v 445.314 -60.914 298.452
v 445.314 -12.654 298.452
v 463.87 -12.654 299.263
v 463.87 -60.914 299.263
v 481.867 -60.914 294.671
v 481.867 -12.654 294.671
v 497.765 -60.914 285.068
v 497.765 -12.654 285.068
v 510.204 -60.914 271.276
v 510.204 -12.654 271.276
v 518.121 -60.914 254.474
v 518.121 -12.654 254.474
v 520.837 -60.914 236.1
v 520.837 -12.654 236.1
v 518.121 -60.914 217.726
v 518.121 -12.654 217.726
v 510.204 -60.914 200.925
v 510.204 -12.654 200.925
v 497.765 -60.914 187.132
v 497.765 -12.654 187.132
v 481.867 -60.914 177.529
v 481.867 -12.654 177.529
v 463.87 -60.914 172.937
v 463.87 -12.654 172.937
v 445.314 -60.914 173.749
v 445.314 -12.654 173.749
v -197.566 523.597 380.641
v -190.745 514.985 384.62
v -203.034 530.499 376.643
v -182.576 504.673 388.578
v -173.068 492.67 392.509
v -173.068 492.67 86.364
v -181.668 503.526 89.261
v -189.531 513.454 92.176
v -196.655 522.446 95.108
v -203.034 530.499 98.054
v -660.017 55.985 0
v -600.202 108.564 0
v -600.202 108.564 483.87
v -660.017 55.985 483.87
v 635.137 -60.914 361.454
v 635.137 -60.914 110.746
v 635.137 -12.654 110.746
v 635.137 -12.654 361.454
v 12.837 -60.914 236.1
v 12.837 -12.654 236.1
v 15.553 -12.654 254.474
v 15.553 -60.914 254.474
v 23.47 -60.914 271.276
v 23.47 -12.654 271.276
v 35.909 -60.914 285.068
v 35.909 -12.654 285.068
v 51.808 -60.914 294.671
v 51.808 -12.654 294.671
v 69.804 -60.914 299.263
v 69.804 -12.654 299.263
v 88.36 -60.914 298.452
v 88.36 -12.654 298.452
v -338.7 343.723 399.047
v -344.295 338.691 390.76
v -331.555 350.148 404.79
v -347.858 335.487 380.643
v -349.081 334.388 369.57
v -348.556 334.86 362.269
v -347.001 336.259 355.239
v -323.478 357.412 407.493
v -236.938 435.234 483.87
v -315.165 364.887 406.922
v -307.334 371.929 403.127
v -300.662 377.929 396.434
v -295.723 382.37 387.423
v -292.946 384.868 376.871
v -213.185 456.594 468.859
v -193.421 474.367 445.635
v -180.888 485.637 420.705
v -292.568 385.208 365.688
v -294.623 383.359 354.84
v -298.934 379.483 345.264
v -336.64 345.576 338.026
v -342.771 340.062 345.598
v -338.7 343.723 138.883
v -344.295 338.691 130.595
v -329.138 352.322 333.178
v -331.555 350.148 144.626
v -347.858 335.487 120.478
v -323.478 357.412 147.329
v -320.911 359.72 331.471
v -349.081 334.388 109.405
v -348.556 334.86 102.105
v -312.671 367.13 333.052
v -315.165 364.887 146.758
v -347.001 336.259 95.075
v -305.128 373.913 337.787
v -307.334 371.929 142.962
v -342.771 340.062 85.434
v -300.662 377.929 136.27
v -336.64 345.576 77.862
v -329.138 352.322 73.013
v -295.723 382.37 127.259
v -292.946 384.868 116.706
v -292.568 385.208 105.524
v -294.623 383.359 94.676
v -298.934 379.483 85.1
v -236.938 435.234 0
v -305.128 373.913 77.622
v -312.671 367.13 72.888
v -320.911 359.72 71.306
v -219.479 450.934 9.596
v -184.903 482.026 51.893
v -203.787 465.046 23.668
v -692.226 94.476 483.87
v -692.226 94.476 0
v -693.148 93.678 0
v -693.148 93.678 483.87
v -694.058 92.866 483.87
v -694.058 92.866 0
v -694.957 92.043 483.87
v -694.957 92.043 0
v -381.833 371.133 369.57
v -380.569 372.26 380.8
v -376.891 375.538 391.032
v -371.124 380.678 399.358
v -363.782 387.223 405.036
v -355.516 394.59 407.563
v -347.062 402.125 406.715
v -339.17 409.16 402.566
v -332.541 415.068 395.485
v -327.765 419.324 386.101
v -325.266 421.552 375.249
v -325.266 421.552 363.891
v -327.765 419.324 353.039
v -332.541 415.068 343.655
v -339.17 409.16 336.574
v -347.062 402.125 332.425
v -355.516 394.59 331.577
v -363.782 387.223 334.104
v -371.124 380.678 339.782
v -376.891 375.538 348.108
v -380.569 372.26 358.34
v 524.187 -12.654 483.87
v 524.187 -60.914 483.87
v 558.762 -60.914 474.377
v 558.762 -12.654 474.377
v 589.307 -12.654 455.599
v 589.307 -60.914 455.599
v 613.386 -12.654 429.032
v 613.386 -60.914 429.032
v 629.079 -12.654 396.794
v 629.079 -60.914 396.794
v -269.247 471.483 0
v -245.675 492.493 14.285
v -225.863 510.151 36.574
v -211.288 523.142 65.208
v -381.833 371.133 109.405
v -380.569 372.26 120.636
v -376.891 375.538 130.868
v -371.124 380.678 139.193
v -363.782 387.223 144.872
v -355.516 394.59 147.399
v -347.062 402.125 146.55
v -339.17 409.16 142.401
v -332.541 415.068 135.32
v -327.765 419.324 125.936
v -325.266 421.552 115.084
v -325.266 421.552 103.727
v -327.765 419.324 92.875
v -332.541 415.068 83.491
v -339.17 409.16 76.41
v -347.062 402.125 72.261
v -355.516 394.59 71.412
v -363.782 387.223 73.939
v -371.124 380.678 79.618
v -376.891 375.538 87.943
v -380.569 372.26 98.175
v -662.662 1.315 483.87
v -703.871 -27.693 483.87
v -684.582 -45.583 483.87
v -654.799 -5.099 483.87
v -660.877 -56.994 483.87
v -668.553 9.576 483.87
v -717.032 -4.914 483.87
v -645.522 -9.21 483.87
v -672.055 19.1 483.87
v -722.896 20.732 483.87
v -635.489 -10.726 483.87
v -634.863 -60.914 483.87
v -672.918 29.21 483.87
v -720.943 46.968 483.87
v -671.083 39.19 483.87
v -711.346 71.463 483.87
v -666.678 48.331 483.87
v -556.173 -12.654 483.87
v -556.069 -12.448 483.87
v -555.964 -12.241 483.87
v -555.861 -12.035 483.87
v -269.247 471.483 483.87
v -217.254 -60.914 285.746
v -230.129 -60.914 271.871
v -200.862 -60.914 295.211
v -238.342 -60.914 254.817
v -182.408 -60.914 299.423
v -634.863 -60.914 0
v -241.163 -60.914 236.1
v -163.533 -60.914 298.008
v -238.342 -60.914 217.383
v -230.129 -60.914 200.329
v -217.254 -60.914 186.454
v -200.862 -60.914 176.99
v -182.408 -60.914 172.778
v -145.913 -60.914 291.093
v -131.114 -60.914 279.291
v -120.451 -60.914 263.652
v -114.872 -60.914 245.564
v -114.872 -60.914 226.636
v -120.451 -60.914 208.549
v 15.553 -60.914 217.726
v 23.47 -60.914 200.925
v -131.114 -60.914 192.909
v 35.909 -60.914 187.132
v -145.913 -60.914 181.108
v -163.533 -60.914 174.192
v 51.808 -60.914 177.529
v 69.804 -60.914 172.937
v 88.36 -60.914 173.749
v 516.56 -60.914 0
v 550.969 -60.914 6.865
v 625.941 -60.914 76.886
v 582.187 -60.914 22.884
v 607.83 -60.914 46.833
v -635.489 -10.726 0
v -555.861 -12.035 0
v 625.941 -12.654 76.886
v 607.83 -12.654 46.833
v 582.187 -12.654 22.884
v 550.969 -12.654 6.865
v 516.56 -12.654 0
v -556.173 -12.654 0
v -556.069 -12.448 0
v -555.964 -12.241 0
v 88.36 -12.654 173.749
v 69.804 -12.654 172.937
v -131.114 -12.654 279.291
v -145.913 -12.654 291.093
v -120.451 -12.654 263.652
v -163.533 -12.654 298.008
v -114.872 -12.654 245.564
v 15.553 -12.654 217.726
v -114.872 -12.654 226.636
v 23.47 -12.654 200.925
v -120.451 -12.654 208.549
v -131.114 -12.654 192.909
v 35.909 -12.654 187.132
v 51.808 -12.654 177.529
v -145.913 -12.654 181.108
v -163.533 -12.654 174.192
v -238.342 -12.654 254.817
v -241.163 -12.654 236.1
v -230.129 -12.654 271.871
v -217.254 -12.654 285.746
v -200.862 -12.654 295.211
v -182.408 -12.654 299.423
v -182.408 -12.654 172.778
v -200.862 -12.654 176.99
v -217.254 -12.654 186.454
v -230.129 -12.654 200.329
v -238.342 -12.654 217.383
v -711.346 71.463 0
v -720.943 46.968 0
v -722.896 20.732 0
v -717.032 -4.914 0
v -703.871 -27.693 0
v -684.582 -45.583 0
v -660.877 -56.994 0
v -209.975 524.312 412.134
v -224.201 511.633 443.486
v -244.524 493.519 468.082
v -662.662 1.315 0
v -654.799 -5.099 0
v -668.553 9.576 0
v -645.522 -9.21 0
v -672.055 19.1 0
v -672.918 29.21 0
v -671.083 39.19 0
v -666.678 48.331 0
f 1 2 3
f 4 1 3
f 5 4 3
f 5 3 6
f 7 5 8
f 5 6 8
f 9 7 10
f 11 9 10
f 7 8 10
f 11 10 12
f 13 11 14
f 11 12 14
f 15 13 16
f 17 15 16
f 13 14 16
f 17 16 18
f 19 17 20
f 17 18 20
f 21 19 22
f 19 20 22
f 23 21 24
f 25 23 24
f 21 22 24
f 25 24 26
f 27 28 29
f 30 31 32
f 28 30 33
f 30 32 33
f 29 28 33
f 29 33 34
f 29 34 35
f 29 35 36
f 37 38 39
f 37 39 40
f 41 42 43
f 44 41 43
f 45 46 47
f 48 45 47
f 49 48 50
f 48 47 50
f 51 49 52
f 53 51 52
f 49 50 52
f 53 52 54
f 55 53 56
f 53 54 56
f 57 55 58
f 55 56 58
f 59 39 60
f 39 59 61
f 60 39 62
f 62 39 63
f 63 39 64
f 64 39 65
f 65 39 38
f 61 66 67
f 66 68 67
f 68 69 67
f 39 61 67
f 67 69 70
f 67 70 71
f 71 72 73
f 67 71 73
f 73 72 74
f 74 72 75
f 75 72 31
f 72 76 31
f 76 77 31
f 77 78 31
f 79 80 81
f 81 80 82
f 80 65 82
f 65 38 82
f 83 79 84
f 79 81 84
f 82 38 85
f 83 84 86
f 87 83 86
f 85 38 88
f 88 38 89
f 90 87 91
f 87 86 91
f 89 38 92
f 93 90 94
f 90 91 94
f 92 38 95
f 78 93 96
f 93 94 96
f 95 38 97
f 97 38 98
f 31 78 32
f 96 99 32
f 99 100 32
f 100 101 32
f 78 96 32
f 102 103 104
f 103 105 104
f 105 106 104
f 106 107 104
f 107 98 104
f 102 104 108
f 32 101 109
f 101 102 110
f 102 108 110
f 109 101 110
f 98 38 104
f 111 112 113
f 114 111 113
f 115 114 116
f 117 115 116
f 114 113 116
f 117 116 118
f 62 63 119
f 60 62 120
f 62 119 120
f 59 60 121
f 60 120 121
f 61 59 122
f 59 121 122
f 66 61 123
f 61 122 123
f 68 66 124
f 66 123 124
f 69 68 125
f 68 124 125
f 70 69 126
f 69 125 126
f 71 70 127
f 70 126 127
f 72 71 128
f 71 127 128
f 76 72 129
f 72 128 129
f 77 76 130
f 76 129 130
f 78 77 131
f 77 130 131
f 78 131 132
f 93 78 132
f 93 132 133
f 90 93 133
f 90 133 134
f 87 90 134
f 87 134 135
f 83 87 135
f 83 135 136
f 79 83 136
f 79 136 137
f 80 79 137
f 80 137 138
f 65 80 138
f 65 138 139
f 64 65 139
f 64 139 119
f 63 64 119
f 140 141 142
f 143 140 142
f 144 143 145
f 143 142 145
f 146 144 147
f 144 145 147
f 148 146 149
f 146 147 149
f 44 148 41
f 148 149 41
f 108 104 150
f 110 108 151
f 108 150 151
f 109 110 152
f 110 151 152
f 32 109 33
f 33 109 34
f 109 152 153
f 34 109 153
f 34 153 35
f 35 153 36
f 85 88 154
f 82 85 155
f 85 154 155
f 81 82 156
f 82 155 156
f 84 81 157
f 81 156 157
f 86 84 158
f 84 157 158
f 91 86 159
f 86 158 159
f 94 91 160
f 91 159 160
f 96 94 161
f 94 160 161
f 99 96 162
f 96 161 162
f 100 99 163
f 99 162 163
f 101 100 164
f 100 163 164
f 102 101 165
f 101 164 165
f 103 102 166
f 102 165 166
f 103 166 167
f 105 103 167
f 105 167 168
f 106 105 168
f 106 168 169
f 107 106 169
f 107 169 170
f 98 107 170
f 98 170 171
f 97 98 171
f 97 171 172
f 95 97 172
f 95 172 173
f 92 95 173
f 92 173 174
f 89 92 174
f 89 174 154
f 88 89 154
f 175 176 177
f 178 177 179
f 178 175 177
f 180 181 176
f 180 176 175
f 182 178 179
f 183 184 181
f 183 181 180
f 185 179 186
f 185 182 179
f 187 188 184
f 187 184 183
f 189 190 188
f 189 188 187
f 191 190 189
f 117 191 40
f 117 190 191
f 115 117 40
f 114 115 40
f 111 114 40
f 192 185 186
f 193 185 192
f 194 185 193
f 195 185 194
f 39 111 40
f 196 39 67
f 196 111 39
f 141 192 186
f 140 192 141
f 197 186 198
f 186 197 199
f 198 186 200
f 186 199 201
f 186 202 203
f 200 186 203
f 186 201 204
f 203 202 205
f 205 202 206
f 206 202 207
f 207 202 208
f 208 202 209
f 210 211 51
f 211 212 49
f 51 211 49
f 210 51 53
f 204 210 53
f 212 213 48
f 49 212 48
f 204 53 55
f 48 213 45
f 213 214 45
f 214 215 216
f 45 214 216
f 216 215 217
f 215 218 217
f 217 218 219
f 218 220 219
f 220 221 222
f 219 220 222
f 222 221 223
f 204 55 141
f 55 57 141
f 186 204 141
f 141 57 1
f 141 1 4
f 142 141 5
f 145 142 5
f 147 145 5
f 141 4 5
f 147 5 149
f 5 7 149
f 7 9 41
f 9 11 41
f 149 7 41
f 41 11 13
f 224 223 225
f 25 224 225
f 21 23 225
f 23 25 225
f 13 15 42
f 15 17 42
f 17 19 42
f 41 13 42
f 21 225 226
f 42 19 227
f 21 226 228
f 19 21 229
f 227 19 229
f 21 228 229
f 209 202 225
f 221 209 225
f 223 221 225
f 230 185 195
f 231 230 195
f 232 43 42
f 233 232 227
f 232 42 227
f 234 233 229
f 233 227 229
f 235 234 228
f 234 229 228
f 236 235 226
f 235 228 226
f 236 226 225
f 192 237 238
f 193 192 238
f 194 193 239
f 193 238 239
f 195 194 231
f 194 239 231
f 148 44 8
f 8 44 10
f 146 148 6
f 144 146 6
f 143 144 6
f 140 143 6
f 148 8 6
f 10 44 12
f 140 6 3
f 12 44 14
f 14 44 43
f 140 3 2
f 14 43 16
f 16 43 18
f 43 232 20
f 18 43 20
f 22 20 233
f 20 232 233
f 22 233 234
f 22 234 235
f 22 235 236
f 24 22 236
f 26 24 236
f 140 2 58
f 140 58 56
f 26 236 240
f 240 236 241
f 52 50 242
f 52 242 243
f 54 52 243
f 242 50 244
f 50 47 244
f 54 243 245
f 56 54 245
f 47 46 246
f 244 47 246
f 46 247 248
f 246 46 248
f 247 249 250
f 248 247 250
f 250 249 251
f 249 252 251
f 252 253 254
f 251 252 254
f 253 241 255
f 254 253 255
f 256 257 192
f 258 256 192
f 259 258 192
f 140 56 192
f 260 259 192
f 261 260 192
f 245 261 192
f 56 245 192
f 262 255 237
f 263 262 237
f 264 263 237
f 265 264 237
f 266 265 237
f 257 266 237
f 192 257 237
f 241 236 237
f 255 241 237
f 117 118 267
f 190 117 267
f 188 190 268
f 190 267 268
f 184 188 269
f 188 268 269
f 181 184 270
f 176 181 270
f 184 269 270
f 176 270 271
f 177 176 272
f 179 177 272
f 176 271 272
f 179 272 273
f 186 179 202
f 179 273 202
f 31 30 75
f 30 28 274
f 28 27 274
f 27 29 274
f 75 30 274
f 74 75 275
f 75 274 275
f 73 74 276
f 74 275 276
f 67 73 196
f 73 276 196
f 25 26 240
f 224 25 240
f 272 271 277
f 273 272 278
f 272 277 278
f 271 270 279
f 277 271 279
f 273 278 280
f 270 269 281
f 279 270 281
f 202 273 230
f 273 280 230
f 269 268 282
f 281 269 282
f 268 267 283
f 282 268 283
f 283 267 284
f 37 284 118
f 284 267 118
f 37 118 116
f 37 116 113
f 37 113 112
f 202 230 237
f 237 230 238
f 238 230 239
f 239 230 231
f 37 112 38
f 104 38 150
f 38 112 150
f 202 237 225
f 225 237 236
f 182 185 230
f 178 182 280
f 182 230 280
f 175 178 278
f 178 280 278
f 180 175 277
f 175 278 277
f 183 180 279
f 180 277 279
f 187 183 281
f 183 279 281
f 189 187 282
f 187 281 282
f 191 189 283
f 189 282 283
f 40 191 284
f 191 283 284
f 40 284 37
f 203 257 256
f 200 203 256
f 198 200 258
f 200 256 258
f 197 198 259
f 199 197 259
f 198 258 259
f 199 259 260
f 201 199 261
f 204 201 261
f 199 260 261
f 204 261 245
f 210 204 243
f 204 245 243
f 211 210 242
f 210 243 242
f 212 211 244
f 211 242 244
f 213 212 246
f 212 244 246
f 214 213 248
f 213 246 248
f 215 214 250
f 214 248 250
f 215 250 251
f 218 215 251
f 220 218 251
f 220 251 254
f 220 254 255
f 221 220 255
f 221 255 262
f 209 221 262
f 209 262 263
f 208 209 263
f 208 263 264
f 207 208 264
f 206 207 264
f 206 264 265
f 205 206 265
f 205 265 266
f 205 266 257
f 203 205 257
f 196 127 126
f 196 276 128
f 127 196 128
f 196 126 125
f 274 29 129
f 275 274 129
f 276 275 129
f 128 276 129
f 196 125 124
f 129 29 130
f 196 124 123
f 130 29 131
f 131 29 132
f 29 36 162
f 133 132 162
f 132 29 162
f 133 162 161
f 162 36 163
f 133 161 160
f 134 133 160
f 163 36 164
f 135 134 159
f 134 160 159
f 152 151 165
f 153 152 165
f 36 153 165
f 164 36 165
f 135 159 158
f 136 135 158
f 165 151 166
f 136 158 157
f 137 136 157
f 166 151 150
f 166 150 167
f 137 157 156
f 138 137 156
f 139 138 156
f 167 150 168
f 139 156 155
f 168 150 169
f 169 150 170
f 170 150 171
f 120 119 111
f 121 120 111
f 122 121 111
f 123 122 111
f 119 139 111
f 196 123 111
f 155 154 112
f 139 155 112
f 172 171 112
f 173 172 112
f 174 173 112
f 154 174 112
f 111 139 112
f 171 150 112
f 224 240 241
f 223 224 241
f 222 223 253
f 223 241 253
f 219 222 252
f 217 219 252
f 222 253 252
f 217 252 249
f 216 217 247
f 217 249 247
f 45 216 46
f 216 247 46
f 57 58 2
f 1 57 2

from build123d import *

# Parameters (mm, degrees)
F1_DEPTH  = 483.87
F2_DEPTH  = 483.87
F4_DEPTH  = 50.8
F6_DEPTH  = 50.8
F7_R      = 38.1
F8_DEPTH  = 50.8
F9_R      = 63.5
F10_DEPTH = 76.2
F12_DEPTH = 635


with BuildPart() as f1:
    # F0 (on Top) → F1 (new body)
    with BuildSketch(Plane.XY):
        with BuildLine():
            Line((-634.862884804, -60.9142784472), (-634.862884804, -12.6542784472))
            Line((-634.862884804, -12.6542784472), (-556.1731070353, -12.6542784472))
            ThreePointArc((-556.1731070353, -12.6542784472), (-549.0114244021, 6.7905310299), (-546.5795370493, 27.3690693075))
            ThreePointArc((-546.5795370493, 27.3690693075), (-561.1950321028, 76.0208623801), (-600.2022649901, 108.5638408442))
            ThreePointArc((-600.2022649901, 108.5638408442), (-637.9975803191, 115.5967473616), (-675.1984709822, 105.8992544496))
            Line((-675.1984709822, 105.8992544496), (-694.956899354, 92.0425484629))
            ThreePointArc((-694.956899354, 92.0425484629), (-717.0320418569, -4.9137298277), (-634.862884804, -60.9142784472))
        make_face()
        with BuildLine():
            ThreePointArc((-596.762884804, 27.3690693075), (-654.0657903767, -5.5377448435), (-653.6058463562, 60.5400112937))
            ThreePointArc((-653.6058463562, 60.5400112937), (-615.6599792314, 60.2758834585), (-596.762884804, 27.3690693075))
        make_face(mode=Mode.SUBTRACT)
        with BuildLine():
            Line((-556.1731070353, -12.6542784472), (-634.862884804, -12.6542784472))
            Line((-634.862884804, -12.6542784472), (-634.862884804, -60.9142784472))
            ThreePointArc((-634.862884804, -60.9142784472), (-588.7079589421, -47.8883044805), (-556.1731070353, -12.6542784472))
        make_face()
        with BuildLine():
            Line((635.137115196, -12.6542784472), (-556.1731070353, -12.6542784472))
            ThreePointArc((-556.1731070353, -12.6542784472), (-588.7079589421, -47.8883044805), (-634.862884804, -60.9142784472))
            Line((-634.862884804, -60.9142784472), (635.137115196, -60.9142784472))
            Line((635.137115196, -60.9142784472), (635.137115196, -12.6542784472))
        make_face()
        with BuildLine():
            Line((-692.2264455581, 94.4762327731), (-694.956899354, 92.0425484629))
            Line((-694.956899354, 92.0425484629), (-675.1984709822, 105.8992544496))
            ThreePointArc((-675.1984709822, 105.8992544496), (-684.0452209002, 100.6837834303), (-692.2264455581, 94.4762327731))
        make_face()
        with BuildLine():
            ThreePointArc((-692.2264455581, 94.4762327731), (-693.6042773982, 93.273532638), (-694.956899354, 92.0425484629))
            Line((-694.956899354, 92.0425484629), (-692.2264455581, 94.4762327731))
        make_face()
        with BuildLine():
            ThreePointArc((-675.1984709822, 105.8992544496), (-637.9975803191, 115.5967473616), (-600.2022649901, 108.5638408442))
            Line((-600.2022649901, 108.5638408442), (-173.0680713738, 492.6695353448))
            Line((-173.0680713738, 492.6695353448), (-203.0335409277, 530.4993943773))
            Line((-203.0335409277, 530.4993943773), (-692.2264455581, 94.4762327731))
            ThreePointArc((-692.2264455581, 94.4762327731), (-684.0452209002, 100.6837834303), (-675.1984709822, 105.8992544496))
        make_face()
    extrude(amount=F1_DEPTH)

    # F0 (on Top) → F2 (join)
    with BuildSketch(Plane.XY):
        with BuildLine():
            Line((-634.862884804, -60.9142784472), (-634.862884804, -12.6542784472))
            Line((-634.862884804, -12.6542784472), (-556.1731070353, -12.6542784472))
            ThreePointArc((-556.1731070353, -12.6542784472), (-549.0114244021, 6.7905310299), (-546.5795370493, 27.3690693075))
            ThreePointArc((-546.5795370493, 27.3690693075), (-561.1950321028, 76.0208623801), (-600.2022649901, 108.5638408442))
            ThreePointArc((-600.2022649901, 108.5638408442), (-637.9975803191, 115.5967473616), (-675.1984709822, 105.8992544496))
            Line((-675.1984709822, 105.8992544496), (-694.956899354, 92.0425484629))
            ThreePointArc((-694.956899354, 92.0425484629), (-717.0320418569, -4.9137298277), (-634.862884804, -60.9142784472))
        make_face()
        with BuildLine():
            ThreePointArc((-596.762884804, 27.3690693075), (-654.0657903767, -5.5377448435), (-653.6058463562, 60.5400112937))
            ThreePointArc((-653.6058463562, 60.5400112937), (-615.6599792314, 60.2758834585), (-596.762884804, 27.3690693075))
        make_face(mode=Mode.SUBTRACT)
        with BuildLine():
            Line((-556.1731070353, -12.6542784472), (-634.862884804, -12.6542784472))
            Line((-634.862884804, -12.6542784472), (-634.862884804, -60.9142784472))
            ThreePointArc((-634.862884804, -60.9142784472), (-588.7079589421, -47.8883044805), (-556.1731070353, -12.6542784472))
        make_face()
        with BuildLine():
            Line((635.137115196, -12.6542784472), (-556.1731070353, -12.6542784472))
            ThreePointArc((-556.1731070353, -12.6542784472), (-588.7079589421, -47.8883044805), (-634.862884804, -60.9142784472))
            Line((-634.862884804, -60.9142784472), (635.137115196, -60.9142784472))
            Line((635.137115196, -60.9142784472), (635.137115196, -12.6542784472))
        make_face()
        with BuildLine():
            Line((-692.2264455581, 94.4762327731), (-694.956899354, 92.0425484629))
            Line((-694.956899354, 92.0425484629), (-675.1984709822, 105.8992544496))
            ThreePointArc((-675.1984709822, 105.8992544496), (-684.0452209002, 100.6837834303), (-692.2264455581, 94.4762327731))
        make_face()
        with BuildLine():
            ThreePointArc((-692.2264455581, 94.4762327731), (-693.6042773982, 93.273532638), (-694.956899354, 92.0425484629))
            Line((-694.956899354, 92.0425484629), (-692.2264455581, 94.4762327731))
        make_face()
        with BuildLine():
            ThreePointArc((-675.1984709822, 105.8992544496), (-637.9975803191, 115.5967473616), (-600.2022649901, 108.5638408442))
            Line((-600.2022649901, 108.5638408442), (-173.0680713738, 492.6695353448))
            Line((-173.0680713738, 492.6695353448), (-203.0335409277, 530.4993943773))
            Line((-203.0335409277, 530.4993943773), (-692.2264455581, 94.4762327731))
            ThreePointArc((-692.2264455581, 94.4762327731), (-684.0452209002, 100.6837834303), (-675.1984709822, 105.8992544496))
        make_face()
    extrude(amount=F2_DEPTH)

    # F3 (on face) → F4 (cut)
    with BuildSketch(Plane(origin=(-353.3908608831, 396.4842167311, 0), x_dir=(-0.7465106955, -0.6653734151, 0), z_dir=(-0.6653734151, 0.7465106955, 0))):
        with BuildLine():
            ThreePointArc((-112.7163544297, 0), (-170.8315172722, 36.574359485), (-201.4134839174, 98.0544313788))
            Line((-201.4134839174, 98.0544313788), (-201.4134839174, 0))
            Line((-201.4134839174, 0), (-112.7163544297, 0))
        make_face()
        with BuildLine():
            Line((-201.4134839174, 483.87), (-201.4134839174, 376.6429126263))
            ThreePointArc((-201.4134839174, 376.6429126263), (-173.0583201372, 443.4860309567), (-112.7163544297, 483.87))
            Line((-112.7163544297, 483.87), (-201.4134839174, 483.87))
        make_face()
    extrude(amount=-F4_DEPTH, mode=Mode.SUBTRACT)

    # F5 (on face) → F6 (cut)
    with BuildSketch(Plane.XZ.offset(60.9142784472)):
        with BuildLine():
            Line((635.137115196, 0), (635.137115196, 110.7464699671))
            ThreePointArc((635.137115196, 110.7464699671), (595.8393127678, 33.9689040087), (516.5598988533, 0))
            Line((516.5598988533, 0), (635.137115196, 0))
        make_face()
        with BuildLine():
            ThreePointArc((524.1865515709, 483.87), (602.2885378872, 443.1693633222), (635.137115196, 361.4538013935))
            Line((635.137115196, 361.4538013935), (635.137115196, 483.87))
            Line((635.137115196, 483.87), (524.1865515709, 483.87))
        make_face()
    extrude(amount=-F6_DEPTH, mode=Mode.SUBTRACT)

    # F7 (on face) → F8 (cut)
    with BuildSketch(Plane(origin=(-353.3908608831, 396.4842167311, 0), x_dir=(-0.7465106955, -0.6653734151, 0), z_dir=(-0.6653734151, 0.7465106955, 0))):
        with Locations((0, 369.57)):
            Circle(F7_R)
        with Locations((0, 109.4054887733)):
            Circle(F7_R)
    extrude(amount=-F8_DEPTH, mode=Mode.SUBTRACT)

    # F9 (on face) → F10 (cut)
    with BuildSketch(Plane(origin=(0, -12.6542784472, 0), x_dir=(-1, 0, 0), z_dir=(0, 1, 0))):
        with BuildLine():
            Line((-76.337115196, 173.7487316132), (-76.337115196, 298.4515397475))
            Line((-76.337115196, 298.4515397475), (-88.3601102827, 298.4515397475))
            ThreePointArc((-88.3601102827, 298.4515397475), (-139.837115196, 236.1001356803), (-88.3601102827, 173.7487316132))
            Line((-88.3601102827, 173.7487316132), (-76.337115196, 173.7487316132))
        make_face()
        with BuildLine():
            Line((-88.3601102827, 298.4515397475), (-76.337115196, 298.4515397475))
            Line((-76.337115196, 298.4515397475), (-76.337115196, 173.7487316132))
            Line((-76.337115196, 173.7487316132), (-88.3601102827, 173.7487316132))
            ThreePointArc((-88.3601102827, 173.7487316132), (-35.9094649304, 187.1322370731), (-12.837115196, 236.1001356803))
            ThreePointArc((-12.837115196, 236.1001356803), (-35.9094649304, 285.0680342875), (-88.3601102827, 298.4515397475))
        make_face()
        with BuildLine():
            Line((-457.337115196, 298.4515397475), (-445.3141201093, 298.4515397475))
            ThreePointArc((-445.3141201093, 298.4515397475), (-520.837115196, 236.1001356803), (-445.3141201093, 173.7487316132))
            Line((-445.3141201093, 173.7487316132), (-457.337115196, 173.7487316132))
            Line((-457.337115196, 173.7487316132), (-457.337115196, 298.4515397475))
        make_face()
        with BuildLine():
            ThreePointArc((-393.837115196, 236.1001356803), (-408.3692165888, 276.5277859459), (-445.3141201093, 298.4515397475))
            Line((-445.3141201093, 298.4515397475), (-457.337115196, 298.4515397475))
            Line((-457.337115196, 298.4515397475), (-457.337115196, 173.7487316132))
            Line((-457.337115196, 173.7487316132), (-445.3141201093, 173.7487316132))
            ThreePointArc((-445.3141201093, 173.7487316132), (-408.3692165888, 195.6724854147), (-393.837115196, 236.1001356803))
        make_face()
        with BuildLine():
            ThreePointArc((-88.3601102827, 173.7487316132), (-139.837115196, 236.1001356803), (-88.3601102827, 298.4515397475))
            Line((-88.3601102827, 298.4515397475), (-445.3141201093, 298.4515397475))
            ThreePointArc((-445.3141201093, 298.4515397475), (-408.3692165888, 276.5277859459), (-393.837115196, 236.1001356803))
            ThreePointArc((-393.837115196, 236.1001356803), (-408.3692165888, 195.6724854147), (-445.3141201093, 173.7487316132))
            Line((-445.3141201093, 173.7487316132), (-88.3601102827, 173.7487316132))
        make_face()
        with Locations((177.662884804, 236.1001356803)):
            Circle(F9_R)
    extrude(amount=-F10_DEPTH, mode=Mode.SUBTRACT)

    # F11 (on face) → F12 (cut)
    with BuildSketch(Plane.XY.offset(483.87)):
        Polygon((-518.1578993797, 89.6325483918), (-600.2022649901, 108.5638408442), (-660.0170895818, 55.9850784981), (-635.4890244176, -10.7257853212), (-518.1578993797, -12.6542784472), align=None)
    extrude(amount=-F12_DEPTH, mode=Mode.SUBTRACT)


solid = f1.part
